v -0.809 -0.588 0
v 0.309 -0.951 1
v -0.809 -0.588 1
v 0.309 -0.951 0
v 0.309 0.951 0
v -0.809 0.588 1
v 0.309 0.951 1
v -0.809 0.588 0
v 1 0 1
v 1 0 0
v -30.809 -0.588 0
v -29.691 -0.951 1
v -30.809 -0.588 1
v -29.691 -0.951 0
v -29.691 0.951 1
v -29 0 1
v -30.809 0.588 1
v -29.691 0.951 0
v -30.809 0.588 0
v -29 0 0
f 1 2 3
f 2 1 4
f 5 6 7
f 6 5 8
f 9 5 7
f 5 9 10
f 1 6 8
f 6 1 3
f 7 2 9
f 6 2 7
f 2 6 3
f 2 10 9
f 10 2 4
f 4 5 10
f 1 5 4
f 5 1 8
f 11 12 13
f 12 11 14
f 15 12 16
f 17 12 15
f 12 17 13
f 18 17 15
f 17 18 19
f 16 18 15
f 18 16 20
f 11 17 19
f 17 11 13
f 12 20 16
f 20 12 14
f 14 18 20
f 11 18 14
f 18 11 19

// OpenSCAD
module bar(pivot,length,width,angle)
  translate(pivot)rotate(angle){*square([length,width],center=false); translate([
      length,0,0])circle(width);};


module cam(pivot=-40,length=25,angle=45,dangle=22.5)
difference()
{{circle(45);color("black")translate([20,0,0])cylinder(1);};
 for (a1 =  [0:5:360])
   {a2=angle+dangle*fcam(1*a1);
    rotate(a1)
    bar([pivot
       ,0,0],length,7,a2);};
   };
  
color("red") cylinder(1);

function fcam_(x,e=(1-1/0.5))=
   (x<1)
     ? (x*((1-e)*(0.875+x^2*(0.375*x^2 -1.25)) + 1))
     : 1+(x-1)*e;
   
function fcam(phase,duty_cycle=0.5)=
  fcam_((((phase+360)/180/(1-duty_cycle)+2)%(2/(1-duty_cycle))-1),1-1/duty_cycle);
 pivot=-30;
 length=25;
 angle=100
   ;
 dangle=22.5;
   
color("blue")translate([pivot,0,0])cylinder(1);
  
echo(fcam(-5));
a1=$t*360;
a2=angle+dangle*fcam(-1*a1);
    bar([pivot,0,0],length,7,a2);  
rotate(a1)cam(pivot=pivot,length=length,angle=angle,dangle=dangle);
